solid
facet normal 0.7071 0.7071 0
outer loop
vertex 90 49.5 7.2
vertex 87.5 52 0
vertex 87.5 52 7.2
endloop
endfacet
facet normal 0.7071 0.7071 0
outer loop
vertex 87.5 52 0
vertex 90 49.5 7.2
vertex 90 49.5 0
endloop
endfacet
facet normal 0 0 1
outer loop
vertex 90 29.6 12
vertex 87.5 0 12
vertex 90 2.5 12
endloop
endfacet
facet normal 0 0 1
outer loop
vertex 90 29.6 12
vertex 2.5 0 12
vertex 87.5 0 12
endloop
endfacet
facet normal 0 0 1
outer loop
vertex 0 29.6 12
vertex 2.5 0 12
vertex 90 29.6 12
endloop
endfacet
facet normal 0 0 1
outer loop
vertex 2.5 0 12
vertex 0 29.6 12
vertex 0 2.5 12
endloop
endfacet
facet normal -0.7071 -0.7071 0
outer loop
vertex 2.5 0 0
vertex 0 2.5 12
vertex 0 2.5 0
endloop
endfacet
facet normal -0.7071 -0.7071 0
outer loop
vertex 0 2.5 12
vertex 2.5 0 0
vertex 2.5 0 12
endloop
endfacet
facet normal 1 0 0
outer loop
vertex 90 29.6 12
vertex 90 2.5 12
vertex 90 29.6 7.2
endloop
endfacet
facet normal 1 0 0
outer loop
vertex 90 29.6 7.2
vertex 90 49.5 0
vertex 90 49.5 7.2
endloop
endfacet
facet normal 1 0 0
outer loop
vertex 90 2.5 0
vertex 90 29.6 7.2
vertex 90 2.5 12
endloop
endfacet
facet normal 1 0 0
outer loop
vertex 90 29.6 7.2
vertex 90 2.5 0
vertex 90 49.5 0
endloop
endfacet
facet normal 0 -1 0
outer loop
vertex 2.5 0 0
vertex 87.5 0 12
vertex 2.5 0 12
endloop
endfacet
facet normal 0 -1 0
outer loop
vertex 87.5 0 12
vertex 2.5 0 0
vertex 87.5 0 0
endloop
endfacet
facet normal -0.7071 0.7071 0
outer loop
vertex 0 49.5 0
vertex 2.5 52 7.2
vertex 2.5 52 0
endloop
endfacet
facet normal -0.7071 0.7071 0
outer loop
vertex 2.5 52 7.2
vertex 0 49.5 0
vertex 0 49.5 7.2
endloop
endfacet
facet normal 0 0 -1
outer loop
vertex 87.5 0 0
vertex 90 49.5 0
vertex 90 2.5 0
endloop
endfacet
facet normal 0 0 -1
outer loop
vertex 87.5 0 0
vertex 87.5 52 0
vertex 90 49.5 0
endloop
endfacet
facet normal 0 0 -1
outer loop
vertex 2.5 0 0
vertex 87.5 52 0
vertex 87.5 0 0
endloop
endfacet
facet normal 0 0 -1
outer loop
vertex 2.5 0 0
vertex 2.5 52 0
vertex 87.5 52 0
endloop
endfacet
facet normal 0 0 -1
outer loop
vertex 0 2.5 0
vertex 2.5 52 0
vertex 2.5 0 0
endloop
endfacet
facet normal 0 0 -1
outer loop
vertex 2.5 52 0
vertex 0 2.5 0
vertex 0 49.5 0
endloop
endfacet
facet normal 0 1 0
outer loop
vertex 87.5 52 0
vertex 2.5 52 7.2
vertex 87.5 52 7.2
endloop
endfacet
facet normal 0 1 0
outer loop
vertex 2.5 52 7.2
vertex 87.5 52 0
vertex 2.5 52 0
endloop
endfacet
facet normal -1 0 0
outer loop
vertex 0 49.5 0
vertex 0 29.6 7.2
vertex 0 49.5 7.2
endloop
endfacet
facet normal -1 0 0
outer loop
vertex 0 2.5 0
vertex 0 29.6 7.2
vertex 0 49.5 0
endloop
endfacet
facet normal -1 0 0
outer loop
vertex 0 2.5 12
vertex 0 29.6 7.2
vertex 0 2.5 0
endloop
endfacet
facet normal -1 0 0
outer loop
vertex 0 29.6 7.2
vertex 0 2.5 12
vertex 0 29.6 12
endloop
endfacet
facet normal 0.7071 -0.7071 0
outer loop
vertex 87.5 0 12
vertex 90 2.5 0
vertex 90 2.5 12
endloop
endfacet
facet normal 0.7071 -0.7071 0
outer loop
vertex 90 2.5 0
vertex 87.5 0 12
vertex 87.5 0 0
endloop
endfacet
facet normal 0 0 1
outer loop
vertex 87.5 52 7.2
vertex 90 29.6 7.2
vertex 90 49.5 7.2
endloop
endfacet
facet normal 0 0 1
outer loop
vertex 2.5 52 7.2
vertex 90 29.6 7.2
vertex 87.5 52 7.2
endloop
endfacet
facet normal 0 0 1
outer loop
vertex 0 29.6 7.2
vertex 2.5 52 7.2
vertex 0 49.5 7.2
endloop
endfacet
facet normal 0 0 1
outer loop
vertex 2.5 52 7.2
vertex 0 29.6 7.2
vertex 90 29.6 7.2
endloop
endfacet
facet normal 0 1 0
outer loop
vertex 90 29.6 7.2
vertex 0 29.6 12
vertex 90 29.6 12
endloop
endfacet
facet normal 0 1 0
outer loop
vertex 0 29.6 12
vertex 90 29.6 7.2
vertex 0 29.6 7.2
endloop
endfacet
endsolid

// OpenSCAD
$fn = 32;

// ----------------------------------------------------------------------
// Stepped bar: sidestep, 90 x 52 x 12/7.2 mm
// ----------------------------------------------------------------------

// --- parameters (mm) ---
bar_l = 90;               // bar length, X
bar_w = 52;               // bar width, Y
plate_t = 12;             // thickness of the thick zone, Z
thin_t = 7.2;             // thickness of the thin zone
corner_c = 2.5;           // corner chamfer of the bar
step_cut = 4.8;           // material removed from the thin zone
ledge_y = 29.6;           // start of the ledge from the front edge
depth_1 = 4.8;            // depth of cut 1 from the top face
fit_tol = 0.1;            // declared fit tolerance (prompt contract)
free_tol = 0.5;           // declared free tolerance (prompt contract)

profile = [[2.5, 0], [87.5, 0], [90, 2.5], [90, 49.5], [87.5, 52], [2.5, 52], [0, 49.5], [0, 2.5]];  // primary outline, 8 points, counter clockwise
void_1 = [[-1, 29.6], [91, 29.6], [91, 53], [-1, 53]];  // ledge cut along one edge, 4 points

// --- the one profile operation ---
difference() {
  linear_extrude(height = plate_t) polygon(points = profile);
  translate([0, 0, plate_t - depth_1])
    linear_extrude(height = depth_1 + 1) polygon(points = void_1);
}
